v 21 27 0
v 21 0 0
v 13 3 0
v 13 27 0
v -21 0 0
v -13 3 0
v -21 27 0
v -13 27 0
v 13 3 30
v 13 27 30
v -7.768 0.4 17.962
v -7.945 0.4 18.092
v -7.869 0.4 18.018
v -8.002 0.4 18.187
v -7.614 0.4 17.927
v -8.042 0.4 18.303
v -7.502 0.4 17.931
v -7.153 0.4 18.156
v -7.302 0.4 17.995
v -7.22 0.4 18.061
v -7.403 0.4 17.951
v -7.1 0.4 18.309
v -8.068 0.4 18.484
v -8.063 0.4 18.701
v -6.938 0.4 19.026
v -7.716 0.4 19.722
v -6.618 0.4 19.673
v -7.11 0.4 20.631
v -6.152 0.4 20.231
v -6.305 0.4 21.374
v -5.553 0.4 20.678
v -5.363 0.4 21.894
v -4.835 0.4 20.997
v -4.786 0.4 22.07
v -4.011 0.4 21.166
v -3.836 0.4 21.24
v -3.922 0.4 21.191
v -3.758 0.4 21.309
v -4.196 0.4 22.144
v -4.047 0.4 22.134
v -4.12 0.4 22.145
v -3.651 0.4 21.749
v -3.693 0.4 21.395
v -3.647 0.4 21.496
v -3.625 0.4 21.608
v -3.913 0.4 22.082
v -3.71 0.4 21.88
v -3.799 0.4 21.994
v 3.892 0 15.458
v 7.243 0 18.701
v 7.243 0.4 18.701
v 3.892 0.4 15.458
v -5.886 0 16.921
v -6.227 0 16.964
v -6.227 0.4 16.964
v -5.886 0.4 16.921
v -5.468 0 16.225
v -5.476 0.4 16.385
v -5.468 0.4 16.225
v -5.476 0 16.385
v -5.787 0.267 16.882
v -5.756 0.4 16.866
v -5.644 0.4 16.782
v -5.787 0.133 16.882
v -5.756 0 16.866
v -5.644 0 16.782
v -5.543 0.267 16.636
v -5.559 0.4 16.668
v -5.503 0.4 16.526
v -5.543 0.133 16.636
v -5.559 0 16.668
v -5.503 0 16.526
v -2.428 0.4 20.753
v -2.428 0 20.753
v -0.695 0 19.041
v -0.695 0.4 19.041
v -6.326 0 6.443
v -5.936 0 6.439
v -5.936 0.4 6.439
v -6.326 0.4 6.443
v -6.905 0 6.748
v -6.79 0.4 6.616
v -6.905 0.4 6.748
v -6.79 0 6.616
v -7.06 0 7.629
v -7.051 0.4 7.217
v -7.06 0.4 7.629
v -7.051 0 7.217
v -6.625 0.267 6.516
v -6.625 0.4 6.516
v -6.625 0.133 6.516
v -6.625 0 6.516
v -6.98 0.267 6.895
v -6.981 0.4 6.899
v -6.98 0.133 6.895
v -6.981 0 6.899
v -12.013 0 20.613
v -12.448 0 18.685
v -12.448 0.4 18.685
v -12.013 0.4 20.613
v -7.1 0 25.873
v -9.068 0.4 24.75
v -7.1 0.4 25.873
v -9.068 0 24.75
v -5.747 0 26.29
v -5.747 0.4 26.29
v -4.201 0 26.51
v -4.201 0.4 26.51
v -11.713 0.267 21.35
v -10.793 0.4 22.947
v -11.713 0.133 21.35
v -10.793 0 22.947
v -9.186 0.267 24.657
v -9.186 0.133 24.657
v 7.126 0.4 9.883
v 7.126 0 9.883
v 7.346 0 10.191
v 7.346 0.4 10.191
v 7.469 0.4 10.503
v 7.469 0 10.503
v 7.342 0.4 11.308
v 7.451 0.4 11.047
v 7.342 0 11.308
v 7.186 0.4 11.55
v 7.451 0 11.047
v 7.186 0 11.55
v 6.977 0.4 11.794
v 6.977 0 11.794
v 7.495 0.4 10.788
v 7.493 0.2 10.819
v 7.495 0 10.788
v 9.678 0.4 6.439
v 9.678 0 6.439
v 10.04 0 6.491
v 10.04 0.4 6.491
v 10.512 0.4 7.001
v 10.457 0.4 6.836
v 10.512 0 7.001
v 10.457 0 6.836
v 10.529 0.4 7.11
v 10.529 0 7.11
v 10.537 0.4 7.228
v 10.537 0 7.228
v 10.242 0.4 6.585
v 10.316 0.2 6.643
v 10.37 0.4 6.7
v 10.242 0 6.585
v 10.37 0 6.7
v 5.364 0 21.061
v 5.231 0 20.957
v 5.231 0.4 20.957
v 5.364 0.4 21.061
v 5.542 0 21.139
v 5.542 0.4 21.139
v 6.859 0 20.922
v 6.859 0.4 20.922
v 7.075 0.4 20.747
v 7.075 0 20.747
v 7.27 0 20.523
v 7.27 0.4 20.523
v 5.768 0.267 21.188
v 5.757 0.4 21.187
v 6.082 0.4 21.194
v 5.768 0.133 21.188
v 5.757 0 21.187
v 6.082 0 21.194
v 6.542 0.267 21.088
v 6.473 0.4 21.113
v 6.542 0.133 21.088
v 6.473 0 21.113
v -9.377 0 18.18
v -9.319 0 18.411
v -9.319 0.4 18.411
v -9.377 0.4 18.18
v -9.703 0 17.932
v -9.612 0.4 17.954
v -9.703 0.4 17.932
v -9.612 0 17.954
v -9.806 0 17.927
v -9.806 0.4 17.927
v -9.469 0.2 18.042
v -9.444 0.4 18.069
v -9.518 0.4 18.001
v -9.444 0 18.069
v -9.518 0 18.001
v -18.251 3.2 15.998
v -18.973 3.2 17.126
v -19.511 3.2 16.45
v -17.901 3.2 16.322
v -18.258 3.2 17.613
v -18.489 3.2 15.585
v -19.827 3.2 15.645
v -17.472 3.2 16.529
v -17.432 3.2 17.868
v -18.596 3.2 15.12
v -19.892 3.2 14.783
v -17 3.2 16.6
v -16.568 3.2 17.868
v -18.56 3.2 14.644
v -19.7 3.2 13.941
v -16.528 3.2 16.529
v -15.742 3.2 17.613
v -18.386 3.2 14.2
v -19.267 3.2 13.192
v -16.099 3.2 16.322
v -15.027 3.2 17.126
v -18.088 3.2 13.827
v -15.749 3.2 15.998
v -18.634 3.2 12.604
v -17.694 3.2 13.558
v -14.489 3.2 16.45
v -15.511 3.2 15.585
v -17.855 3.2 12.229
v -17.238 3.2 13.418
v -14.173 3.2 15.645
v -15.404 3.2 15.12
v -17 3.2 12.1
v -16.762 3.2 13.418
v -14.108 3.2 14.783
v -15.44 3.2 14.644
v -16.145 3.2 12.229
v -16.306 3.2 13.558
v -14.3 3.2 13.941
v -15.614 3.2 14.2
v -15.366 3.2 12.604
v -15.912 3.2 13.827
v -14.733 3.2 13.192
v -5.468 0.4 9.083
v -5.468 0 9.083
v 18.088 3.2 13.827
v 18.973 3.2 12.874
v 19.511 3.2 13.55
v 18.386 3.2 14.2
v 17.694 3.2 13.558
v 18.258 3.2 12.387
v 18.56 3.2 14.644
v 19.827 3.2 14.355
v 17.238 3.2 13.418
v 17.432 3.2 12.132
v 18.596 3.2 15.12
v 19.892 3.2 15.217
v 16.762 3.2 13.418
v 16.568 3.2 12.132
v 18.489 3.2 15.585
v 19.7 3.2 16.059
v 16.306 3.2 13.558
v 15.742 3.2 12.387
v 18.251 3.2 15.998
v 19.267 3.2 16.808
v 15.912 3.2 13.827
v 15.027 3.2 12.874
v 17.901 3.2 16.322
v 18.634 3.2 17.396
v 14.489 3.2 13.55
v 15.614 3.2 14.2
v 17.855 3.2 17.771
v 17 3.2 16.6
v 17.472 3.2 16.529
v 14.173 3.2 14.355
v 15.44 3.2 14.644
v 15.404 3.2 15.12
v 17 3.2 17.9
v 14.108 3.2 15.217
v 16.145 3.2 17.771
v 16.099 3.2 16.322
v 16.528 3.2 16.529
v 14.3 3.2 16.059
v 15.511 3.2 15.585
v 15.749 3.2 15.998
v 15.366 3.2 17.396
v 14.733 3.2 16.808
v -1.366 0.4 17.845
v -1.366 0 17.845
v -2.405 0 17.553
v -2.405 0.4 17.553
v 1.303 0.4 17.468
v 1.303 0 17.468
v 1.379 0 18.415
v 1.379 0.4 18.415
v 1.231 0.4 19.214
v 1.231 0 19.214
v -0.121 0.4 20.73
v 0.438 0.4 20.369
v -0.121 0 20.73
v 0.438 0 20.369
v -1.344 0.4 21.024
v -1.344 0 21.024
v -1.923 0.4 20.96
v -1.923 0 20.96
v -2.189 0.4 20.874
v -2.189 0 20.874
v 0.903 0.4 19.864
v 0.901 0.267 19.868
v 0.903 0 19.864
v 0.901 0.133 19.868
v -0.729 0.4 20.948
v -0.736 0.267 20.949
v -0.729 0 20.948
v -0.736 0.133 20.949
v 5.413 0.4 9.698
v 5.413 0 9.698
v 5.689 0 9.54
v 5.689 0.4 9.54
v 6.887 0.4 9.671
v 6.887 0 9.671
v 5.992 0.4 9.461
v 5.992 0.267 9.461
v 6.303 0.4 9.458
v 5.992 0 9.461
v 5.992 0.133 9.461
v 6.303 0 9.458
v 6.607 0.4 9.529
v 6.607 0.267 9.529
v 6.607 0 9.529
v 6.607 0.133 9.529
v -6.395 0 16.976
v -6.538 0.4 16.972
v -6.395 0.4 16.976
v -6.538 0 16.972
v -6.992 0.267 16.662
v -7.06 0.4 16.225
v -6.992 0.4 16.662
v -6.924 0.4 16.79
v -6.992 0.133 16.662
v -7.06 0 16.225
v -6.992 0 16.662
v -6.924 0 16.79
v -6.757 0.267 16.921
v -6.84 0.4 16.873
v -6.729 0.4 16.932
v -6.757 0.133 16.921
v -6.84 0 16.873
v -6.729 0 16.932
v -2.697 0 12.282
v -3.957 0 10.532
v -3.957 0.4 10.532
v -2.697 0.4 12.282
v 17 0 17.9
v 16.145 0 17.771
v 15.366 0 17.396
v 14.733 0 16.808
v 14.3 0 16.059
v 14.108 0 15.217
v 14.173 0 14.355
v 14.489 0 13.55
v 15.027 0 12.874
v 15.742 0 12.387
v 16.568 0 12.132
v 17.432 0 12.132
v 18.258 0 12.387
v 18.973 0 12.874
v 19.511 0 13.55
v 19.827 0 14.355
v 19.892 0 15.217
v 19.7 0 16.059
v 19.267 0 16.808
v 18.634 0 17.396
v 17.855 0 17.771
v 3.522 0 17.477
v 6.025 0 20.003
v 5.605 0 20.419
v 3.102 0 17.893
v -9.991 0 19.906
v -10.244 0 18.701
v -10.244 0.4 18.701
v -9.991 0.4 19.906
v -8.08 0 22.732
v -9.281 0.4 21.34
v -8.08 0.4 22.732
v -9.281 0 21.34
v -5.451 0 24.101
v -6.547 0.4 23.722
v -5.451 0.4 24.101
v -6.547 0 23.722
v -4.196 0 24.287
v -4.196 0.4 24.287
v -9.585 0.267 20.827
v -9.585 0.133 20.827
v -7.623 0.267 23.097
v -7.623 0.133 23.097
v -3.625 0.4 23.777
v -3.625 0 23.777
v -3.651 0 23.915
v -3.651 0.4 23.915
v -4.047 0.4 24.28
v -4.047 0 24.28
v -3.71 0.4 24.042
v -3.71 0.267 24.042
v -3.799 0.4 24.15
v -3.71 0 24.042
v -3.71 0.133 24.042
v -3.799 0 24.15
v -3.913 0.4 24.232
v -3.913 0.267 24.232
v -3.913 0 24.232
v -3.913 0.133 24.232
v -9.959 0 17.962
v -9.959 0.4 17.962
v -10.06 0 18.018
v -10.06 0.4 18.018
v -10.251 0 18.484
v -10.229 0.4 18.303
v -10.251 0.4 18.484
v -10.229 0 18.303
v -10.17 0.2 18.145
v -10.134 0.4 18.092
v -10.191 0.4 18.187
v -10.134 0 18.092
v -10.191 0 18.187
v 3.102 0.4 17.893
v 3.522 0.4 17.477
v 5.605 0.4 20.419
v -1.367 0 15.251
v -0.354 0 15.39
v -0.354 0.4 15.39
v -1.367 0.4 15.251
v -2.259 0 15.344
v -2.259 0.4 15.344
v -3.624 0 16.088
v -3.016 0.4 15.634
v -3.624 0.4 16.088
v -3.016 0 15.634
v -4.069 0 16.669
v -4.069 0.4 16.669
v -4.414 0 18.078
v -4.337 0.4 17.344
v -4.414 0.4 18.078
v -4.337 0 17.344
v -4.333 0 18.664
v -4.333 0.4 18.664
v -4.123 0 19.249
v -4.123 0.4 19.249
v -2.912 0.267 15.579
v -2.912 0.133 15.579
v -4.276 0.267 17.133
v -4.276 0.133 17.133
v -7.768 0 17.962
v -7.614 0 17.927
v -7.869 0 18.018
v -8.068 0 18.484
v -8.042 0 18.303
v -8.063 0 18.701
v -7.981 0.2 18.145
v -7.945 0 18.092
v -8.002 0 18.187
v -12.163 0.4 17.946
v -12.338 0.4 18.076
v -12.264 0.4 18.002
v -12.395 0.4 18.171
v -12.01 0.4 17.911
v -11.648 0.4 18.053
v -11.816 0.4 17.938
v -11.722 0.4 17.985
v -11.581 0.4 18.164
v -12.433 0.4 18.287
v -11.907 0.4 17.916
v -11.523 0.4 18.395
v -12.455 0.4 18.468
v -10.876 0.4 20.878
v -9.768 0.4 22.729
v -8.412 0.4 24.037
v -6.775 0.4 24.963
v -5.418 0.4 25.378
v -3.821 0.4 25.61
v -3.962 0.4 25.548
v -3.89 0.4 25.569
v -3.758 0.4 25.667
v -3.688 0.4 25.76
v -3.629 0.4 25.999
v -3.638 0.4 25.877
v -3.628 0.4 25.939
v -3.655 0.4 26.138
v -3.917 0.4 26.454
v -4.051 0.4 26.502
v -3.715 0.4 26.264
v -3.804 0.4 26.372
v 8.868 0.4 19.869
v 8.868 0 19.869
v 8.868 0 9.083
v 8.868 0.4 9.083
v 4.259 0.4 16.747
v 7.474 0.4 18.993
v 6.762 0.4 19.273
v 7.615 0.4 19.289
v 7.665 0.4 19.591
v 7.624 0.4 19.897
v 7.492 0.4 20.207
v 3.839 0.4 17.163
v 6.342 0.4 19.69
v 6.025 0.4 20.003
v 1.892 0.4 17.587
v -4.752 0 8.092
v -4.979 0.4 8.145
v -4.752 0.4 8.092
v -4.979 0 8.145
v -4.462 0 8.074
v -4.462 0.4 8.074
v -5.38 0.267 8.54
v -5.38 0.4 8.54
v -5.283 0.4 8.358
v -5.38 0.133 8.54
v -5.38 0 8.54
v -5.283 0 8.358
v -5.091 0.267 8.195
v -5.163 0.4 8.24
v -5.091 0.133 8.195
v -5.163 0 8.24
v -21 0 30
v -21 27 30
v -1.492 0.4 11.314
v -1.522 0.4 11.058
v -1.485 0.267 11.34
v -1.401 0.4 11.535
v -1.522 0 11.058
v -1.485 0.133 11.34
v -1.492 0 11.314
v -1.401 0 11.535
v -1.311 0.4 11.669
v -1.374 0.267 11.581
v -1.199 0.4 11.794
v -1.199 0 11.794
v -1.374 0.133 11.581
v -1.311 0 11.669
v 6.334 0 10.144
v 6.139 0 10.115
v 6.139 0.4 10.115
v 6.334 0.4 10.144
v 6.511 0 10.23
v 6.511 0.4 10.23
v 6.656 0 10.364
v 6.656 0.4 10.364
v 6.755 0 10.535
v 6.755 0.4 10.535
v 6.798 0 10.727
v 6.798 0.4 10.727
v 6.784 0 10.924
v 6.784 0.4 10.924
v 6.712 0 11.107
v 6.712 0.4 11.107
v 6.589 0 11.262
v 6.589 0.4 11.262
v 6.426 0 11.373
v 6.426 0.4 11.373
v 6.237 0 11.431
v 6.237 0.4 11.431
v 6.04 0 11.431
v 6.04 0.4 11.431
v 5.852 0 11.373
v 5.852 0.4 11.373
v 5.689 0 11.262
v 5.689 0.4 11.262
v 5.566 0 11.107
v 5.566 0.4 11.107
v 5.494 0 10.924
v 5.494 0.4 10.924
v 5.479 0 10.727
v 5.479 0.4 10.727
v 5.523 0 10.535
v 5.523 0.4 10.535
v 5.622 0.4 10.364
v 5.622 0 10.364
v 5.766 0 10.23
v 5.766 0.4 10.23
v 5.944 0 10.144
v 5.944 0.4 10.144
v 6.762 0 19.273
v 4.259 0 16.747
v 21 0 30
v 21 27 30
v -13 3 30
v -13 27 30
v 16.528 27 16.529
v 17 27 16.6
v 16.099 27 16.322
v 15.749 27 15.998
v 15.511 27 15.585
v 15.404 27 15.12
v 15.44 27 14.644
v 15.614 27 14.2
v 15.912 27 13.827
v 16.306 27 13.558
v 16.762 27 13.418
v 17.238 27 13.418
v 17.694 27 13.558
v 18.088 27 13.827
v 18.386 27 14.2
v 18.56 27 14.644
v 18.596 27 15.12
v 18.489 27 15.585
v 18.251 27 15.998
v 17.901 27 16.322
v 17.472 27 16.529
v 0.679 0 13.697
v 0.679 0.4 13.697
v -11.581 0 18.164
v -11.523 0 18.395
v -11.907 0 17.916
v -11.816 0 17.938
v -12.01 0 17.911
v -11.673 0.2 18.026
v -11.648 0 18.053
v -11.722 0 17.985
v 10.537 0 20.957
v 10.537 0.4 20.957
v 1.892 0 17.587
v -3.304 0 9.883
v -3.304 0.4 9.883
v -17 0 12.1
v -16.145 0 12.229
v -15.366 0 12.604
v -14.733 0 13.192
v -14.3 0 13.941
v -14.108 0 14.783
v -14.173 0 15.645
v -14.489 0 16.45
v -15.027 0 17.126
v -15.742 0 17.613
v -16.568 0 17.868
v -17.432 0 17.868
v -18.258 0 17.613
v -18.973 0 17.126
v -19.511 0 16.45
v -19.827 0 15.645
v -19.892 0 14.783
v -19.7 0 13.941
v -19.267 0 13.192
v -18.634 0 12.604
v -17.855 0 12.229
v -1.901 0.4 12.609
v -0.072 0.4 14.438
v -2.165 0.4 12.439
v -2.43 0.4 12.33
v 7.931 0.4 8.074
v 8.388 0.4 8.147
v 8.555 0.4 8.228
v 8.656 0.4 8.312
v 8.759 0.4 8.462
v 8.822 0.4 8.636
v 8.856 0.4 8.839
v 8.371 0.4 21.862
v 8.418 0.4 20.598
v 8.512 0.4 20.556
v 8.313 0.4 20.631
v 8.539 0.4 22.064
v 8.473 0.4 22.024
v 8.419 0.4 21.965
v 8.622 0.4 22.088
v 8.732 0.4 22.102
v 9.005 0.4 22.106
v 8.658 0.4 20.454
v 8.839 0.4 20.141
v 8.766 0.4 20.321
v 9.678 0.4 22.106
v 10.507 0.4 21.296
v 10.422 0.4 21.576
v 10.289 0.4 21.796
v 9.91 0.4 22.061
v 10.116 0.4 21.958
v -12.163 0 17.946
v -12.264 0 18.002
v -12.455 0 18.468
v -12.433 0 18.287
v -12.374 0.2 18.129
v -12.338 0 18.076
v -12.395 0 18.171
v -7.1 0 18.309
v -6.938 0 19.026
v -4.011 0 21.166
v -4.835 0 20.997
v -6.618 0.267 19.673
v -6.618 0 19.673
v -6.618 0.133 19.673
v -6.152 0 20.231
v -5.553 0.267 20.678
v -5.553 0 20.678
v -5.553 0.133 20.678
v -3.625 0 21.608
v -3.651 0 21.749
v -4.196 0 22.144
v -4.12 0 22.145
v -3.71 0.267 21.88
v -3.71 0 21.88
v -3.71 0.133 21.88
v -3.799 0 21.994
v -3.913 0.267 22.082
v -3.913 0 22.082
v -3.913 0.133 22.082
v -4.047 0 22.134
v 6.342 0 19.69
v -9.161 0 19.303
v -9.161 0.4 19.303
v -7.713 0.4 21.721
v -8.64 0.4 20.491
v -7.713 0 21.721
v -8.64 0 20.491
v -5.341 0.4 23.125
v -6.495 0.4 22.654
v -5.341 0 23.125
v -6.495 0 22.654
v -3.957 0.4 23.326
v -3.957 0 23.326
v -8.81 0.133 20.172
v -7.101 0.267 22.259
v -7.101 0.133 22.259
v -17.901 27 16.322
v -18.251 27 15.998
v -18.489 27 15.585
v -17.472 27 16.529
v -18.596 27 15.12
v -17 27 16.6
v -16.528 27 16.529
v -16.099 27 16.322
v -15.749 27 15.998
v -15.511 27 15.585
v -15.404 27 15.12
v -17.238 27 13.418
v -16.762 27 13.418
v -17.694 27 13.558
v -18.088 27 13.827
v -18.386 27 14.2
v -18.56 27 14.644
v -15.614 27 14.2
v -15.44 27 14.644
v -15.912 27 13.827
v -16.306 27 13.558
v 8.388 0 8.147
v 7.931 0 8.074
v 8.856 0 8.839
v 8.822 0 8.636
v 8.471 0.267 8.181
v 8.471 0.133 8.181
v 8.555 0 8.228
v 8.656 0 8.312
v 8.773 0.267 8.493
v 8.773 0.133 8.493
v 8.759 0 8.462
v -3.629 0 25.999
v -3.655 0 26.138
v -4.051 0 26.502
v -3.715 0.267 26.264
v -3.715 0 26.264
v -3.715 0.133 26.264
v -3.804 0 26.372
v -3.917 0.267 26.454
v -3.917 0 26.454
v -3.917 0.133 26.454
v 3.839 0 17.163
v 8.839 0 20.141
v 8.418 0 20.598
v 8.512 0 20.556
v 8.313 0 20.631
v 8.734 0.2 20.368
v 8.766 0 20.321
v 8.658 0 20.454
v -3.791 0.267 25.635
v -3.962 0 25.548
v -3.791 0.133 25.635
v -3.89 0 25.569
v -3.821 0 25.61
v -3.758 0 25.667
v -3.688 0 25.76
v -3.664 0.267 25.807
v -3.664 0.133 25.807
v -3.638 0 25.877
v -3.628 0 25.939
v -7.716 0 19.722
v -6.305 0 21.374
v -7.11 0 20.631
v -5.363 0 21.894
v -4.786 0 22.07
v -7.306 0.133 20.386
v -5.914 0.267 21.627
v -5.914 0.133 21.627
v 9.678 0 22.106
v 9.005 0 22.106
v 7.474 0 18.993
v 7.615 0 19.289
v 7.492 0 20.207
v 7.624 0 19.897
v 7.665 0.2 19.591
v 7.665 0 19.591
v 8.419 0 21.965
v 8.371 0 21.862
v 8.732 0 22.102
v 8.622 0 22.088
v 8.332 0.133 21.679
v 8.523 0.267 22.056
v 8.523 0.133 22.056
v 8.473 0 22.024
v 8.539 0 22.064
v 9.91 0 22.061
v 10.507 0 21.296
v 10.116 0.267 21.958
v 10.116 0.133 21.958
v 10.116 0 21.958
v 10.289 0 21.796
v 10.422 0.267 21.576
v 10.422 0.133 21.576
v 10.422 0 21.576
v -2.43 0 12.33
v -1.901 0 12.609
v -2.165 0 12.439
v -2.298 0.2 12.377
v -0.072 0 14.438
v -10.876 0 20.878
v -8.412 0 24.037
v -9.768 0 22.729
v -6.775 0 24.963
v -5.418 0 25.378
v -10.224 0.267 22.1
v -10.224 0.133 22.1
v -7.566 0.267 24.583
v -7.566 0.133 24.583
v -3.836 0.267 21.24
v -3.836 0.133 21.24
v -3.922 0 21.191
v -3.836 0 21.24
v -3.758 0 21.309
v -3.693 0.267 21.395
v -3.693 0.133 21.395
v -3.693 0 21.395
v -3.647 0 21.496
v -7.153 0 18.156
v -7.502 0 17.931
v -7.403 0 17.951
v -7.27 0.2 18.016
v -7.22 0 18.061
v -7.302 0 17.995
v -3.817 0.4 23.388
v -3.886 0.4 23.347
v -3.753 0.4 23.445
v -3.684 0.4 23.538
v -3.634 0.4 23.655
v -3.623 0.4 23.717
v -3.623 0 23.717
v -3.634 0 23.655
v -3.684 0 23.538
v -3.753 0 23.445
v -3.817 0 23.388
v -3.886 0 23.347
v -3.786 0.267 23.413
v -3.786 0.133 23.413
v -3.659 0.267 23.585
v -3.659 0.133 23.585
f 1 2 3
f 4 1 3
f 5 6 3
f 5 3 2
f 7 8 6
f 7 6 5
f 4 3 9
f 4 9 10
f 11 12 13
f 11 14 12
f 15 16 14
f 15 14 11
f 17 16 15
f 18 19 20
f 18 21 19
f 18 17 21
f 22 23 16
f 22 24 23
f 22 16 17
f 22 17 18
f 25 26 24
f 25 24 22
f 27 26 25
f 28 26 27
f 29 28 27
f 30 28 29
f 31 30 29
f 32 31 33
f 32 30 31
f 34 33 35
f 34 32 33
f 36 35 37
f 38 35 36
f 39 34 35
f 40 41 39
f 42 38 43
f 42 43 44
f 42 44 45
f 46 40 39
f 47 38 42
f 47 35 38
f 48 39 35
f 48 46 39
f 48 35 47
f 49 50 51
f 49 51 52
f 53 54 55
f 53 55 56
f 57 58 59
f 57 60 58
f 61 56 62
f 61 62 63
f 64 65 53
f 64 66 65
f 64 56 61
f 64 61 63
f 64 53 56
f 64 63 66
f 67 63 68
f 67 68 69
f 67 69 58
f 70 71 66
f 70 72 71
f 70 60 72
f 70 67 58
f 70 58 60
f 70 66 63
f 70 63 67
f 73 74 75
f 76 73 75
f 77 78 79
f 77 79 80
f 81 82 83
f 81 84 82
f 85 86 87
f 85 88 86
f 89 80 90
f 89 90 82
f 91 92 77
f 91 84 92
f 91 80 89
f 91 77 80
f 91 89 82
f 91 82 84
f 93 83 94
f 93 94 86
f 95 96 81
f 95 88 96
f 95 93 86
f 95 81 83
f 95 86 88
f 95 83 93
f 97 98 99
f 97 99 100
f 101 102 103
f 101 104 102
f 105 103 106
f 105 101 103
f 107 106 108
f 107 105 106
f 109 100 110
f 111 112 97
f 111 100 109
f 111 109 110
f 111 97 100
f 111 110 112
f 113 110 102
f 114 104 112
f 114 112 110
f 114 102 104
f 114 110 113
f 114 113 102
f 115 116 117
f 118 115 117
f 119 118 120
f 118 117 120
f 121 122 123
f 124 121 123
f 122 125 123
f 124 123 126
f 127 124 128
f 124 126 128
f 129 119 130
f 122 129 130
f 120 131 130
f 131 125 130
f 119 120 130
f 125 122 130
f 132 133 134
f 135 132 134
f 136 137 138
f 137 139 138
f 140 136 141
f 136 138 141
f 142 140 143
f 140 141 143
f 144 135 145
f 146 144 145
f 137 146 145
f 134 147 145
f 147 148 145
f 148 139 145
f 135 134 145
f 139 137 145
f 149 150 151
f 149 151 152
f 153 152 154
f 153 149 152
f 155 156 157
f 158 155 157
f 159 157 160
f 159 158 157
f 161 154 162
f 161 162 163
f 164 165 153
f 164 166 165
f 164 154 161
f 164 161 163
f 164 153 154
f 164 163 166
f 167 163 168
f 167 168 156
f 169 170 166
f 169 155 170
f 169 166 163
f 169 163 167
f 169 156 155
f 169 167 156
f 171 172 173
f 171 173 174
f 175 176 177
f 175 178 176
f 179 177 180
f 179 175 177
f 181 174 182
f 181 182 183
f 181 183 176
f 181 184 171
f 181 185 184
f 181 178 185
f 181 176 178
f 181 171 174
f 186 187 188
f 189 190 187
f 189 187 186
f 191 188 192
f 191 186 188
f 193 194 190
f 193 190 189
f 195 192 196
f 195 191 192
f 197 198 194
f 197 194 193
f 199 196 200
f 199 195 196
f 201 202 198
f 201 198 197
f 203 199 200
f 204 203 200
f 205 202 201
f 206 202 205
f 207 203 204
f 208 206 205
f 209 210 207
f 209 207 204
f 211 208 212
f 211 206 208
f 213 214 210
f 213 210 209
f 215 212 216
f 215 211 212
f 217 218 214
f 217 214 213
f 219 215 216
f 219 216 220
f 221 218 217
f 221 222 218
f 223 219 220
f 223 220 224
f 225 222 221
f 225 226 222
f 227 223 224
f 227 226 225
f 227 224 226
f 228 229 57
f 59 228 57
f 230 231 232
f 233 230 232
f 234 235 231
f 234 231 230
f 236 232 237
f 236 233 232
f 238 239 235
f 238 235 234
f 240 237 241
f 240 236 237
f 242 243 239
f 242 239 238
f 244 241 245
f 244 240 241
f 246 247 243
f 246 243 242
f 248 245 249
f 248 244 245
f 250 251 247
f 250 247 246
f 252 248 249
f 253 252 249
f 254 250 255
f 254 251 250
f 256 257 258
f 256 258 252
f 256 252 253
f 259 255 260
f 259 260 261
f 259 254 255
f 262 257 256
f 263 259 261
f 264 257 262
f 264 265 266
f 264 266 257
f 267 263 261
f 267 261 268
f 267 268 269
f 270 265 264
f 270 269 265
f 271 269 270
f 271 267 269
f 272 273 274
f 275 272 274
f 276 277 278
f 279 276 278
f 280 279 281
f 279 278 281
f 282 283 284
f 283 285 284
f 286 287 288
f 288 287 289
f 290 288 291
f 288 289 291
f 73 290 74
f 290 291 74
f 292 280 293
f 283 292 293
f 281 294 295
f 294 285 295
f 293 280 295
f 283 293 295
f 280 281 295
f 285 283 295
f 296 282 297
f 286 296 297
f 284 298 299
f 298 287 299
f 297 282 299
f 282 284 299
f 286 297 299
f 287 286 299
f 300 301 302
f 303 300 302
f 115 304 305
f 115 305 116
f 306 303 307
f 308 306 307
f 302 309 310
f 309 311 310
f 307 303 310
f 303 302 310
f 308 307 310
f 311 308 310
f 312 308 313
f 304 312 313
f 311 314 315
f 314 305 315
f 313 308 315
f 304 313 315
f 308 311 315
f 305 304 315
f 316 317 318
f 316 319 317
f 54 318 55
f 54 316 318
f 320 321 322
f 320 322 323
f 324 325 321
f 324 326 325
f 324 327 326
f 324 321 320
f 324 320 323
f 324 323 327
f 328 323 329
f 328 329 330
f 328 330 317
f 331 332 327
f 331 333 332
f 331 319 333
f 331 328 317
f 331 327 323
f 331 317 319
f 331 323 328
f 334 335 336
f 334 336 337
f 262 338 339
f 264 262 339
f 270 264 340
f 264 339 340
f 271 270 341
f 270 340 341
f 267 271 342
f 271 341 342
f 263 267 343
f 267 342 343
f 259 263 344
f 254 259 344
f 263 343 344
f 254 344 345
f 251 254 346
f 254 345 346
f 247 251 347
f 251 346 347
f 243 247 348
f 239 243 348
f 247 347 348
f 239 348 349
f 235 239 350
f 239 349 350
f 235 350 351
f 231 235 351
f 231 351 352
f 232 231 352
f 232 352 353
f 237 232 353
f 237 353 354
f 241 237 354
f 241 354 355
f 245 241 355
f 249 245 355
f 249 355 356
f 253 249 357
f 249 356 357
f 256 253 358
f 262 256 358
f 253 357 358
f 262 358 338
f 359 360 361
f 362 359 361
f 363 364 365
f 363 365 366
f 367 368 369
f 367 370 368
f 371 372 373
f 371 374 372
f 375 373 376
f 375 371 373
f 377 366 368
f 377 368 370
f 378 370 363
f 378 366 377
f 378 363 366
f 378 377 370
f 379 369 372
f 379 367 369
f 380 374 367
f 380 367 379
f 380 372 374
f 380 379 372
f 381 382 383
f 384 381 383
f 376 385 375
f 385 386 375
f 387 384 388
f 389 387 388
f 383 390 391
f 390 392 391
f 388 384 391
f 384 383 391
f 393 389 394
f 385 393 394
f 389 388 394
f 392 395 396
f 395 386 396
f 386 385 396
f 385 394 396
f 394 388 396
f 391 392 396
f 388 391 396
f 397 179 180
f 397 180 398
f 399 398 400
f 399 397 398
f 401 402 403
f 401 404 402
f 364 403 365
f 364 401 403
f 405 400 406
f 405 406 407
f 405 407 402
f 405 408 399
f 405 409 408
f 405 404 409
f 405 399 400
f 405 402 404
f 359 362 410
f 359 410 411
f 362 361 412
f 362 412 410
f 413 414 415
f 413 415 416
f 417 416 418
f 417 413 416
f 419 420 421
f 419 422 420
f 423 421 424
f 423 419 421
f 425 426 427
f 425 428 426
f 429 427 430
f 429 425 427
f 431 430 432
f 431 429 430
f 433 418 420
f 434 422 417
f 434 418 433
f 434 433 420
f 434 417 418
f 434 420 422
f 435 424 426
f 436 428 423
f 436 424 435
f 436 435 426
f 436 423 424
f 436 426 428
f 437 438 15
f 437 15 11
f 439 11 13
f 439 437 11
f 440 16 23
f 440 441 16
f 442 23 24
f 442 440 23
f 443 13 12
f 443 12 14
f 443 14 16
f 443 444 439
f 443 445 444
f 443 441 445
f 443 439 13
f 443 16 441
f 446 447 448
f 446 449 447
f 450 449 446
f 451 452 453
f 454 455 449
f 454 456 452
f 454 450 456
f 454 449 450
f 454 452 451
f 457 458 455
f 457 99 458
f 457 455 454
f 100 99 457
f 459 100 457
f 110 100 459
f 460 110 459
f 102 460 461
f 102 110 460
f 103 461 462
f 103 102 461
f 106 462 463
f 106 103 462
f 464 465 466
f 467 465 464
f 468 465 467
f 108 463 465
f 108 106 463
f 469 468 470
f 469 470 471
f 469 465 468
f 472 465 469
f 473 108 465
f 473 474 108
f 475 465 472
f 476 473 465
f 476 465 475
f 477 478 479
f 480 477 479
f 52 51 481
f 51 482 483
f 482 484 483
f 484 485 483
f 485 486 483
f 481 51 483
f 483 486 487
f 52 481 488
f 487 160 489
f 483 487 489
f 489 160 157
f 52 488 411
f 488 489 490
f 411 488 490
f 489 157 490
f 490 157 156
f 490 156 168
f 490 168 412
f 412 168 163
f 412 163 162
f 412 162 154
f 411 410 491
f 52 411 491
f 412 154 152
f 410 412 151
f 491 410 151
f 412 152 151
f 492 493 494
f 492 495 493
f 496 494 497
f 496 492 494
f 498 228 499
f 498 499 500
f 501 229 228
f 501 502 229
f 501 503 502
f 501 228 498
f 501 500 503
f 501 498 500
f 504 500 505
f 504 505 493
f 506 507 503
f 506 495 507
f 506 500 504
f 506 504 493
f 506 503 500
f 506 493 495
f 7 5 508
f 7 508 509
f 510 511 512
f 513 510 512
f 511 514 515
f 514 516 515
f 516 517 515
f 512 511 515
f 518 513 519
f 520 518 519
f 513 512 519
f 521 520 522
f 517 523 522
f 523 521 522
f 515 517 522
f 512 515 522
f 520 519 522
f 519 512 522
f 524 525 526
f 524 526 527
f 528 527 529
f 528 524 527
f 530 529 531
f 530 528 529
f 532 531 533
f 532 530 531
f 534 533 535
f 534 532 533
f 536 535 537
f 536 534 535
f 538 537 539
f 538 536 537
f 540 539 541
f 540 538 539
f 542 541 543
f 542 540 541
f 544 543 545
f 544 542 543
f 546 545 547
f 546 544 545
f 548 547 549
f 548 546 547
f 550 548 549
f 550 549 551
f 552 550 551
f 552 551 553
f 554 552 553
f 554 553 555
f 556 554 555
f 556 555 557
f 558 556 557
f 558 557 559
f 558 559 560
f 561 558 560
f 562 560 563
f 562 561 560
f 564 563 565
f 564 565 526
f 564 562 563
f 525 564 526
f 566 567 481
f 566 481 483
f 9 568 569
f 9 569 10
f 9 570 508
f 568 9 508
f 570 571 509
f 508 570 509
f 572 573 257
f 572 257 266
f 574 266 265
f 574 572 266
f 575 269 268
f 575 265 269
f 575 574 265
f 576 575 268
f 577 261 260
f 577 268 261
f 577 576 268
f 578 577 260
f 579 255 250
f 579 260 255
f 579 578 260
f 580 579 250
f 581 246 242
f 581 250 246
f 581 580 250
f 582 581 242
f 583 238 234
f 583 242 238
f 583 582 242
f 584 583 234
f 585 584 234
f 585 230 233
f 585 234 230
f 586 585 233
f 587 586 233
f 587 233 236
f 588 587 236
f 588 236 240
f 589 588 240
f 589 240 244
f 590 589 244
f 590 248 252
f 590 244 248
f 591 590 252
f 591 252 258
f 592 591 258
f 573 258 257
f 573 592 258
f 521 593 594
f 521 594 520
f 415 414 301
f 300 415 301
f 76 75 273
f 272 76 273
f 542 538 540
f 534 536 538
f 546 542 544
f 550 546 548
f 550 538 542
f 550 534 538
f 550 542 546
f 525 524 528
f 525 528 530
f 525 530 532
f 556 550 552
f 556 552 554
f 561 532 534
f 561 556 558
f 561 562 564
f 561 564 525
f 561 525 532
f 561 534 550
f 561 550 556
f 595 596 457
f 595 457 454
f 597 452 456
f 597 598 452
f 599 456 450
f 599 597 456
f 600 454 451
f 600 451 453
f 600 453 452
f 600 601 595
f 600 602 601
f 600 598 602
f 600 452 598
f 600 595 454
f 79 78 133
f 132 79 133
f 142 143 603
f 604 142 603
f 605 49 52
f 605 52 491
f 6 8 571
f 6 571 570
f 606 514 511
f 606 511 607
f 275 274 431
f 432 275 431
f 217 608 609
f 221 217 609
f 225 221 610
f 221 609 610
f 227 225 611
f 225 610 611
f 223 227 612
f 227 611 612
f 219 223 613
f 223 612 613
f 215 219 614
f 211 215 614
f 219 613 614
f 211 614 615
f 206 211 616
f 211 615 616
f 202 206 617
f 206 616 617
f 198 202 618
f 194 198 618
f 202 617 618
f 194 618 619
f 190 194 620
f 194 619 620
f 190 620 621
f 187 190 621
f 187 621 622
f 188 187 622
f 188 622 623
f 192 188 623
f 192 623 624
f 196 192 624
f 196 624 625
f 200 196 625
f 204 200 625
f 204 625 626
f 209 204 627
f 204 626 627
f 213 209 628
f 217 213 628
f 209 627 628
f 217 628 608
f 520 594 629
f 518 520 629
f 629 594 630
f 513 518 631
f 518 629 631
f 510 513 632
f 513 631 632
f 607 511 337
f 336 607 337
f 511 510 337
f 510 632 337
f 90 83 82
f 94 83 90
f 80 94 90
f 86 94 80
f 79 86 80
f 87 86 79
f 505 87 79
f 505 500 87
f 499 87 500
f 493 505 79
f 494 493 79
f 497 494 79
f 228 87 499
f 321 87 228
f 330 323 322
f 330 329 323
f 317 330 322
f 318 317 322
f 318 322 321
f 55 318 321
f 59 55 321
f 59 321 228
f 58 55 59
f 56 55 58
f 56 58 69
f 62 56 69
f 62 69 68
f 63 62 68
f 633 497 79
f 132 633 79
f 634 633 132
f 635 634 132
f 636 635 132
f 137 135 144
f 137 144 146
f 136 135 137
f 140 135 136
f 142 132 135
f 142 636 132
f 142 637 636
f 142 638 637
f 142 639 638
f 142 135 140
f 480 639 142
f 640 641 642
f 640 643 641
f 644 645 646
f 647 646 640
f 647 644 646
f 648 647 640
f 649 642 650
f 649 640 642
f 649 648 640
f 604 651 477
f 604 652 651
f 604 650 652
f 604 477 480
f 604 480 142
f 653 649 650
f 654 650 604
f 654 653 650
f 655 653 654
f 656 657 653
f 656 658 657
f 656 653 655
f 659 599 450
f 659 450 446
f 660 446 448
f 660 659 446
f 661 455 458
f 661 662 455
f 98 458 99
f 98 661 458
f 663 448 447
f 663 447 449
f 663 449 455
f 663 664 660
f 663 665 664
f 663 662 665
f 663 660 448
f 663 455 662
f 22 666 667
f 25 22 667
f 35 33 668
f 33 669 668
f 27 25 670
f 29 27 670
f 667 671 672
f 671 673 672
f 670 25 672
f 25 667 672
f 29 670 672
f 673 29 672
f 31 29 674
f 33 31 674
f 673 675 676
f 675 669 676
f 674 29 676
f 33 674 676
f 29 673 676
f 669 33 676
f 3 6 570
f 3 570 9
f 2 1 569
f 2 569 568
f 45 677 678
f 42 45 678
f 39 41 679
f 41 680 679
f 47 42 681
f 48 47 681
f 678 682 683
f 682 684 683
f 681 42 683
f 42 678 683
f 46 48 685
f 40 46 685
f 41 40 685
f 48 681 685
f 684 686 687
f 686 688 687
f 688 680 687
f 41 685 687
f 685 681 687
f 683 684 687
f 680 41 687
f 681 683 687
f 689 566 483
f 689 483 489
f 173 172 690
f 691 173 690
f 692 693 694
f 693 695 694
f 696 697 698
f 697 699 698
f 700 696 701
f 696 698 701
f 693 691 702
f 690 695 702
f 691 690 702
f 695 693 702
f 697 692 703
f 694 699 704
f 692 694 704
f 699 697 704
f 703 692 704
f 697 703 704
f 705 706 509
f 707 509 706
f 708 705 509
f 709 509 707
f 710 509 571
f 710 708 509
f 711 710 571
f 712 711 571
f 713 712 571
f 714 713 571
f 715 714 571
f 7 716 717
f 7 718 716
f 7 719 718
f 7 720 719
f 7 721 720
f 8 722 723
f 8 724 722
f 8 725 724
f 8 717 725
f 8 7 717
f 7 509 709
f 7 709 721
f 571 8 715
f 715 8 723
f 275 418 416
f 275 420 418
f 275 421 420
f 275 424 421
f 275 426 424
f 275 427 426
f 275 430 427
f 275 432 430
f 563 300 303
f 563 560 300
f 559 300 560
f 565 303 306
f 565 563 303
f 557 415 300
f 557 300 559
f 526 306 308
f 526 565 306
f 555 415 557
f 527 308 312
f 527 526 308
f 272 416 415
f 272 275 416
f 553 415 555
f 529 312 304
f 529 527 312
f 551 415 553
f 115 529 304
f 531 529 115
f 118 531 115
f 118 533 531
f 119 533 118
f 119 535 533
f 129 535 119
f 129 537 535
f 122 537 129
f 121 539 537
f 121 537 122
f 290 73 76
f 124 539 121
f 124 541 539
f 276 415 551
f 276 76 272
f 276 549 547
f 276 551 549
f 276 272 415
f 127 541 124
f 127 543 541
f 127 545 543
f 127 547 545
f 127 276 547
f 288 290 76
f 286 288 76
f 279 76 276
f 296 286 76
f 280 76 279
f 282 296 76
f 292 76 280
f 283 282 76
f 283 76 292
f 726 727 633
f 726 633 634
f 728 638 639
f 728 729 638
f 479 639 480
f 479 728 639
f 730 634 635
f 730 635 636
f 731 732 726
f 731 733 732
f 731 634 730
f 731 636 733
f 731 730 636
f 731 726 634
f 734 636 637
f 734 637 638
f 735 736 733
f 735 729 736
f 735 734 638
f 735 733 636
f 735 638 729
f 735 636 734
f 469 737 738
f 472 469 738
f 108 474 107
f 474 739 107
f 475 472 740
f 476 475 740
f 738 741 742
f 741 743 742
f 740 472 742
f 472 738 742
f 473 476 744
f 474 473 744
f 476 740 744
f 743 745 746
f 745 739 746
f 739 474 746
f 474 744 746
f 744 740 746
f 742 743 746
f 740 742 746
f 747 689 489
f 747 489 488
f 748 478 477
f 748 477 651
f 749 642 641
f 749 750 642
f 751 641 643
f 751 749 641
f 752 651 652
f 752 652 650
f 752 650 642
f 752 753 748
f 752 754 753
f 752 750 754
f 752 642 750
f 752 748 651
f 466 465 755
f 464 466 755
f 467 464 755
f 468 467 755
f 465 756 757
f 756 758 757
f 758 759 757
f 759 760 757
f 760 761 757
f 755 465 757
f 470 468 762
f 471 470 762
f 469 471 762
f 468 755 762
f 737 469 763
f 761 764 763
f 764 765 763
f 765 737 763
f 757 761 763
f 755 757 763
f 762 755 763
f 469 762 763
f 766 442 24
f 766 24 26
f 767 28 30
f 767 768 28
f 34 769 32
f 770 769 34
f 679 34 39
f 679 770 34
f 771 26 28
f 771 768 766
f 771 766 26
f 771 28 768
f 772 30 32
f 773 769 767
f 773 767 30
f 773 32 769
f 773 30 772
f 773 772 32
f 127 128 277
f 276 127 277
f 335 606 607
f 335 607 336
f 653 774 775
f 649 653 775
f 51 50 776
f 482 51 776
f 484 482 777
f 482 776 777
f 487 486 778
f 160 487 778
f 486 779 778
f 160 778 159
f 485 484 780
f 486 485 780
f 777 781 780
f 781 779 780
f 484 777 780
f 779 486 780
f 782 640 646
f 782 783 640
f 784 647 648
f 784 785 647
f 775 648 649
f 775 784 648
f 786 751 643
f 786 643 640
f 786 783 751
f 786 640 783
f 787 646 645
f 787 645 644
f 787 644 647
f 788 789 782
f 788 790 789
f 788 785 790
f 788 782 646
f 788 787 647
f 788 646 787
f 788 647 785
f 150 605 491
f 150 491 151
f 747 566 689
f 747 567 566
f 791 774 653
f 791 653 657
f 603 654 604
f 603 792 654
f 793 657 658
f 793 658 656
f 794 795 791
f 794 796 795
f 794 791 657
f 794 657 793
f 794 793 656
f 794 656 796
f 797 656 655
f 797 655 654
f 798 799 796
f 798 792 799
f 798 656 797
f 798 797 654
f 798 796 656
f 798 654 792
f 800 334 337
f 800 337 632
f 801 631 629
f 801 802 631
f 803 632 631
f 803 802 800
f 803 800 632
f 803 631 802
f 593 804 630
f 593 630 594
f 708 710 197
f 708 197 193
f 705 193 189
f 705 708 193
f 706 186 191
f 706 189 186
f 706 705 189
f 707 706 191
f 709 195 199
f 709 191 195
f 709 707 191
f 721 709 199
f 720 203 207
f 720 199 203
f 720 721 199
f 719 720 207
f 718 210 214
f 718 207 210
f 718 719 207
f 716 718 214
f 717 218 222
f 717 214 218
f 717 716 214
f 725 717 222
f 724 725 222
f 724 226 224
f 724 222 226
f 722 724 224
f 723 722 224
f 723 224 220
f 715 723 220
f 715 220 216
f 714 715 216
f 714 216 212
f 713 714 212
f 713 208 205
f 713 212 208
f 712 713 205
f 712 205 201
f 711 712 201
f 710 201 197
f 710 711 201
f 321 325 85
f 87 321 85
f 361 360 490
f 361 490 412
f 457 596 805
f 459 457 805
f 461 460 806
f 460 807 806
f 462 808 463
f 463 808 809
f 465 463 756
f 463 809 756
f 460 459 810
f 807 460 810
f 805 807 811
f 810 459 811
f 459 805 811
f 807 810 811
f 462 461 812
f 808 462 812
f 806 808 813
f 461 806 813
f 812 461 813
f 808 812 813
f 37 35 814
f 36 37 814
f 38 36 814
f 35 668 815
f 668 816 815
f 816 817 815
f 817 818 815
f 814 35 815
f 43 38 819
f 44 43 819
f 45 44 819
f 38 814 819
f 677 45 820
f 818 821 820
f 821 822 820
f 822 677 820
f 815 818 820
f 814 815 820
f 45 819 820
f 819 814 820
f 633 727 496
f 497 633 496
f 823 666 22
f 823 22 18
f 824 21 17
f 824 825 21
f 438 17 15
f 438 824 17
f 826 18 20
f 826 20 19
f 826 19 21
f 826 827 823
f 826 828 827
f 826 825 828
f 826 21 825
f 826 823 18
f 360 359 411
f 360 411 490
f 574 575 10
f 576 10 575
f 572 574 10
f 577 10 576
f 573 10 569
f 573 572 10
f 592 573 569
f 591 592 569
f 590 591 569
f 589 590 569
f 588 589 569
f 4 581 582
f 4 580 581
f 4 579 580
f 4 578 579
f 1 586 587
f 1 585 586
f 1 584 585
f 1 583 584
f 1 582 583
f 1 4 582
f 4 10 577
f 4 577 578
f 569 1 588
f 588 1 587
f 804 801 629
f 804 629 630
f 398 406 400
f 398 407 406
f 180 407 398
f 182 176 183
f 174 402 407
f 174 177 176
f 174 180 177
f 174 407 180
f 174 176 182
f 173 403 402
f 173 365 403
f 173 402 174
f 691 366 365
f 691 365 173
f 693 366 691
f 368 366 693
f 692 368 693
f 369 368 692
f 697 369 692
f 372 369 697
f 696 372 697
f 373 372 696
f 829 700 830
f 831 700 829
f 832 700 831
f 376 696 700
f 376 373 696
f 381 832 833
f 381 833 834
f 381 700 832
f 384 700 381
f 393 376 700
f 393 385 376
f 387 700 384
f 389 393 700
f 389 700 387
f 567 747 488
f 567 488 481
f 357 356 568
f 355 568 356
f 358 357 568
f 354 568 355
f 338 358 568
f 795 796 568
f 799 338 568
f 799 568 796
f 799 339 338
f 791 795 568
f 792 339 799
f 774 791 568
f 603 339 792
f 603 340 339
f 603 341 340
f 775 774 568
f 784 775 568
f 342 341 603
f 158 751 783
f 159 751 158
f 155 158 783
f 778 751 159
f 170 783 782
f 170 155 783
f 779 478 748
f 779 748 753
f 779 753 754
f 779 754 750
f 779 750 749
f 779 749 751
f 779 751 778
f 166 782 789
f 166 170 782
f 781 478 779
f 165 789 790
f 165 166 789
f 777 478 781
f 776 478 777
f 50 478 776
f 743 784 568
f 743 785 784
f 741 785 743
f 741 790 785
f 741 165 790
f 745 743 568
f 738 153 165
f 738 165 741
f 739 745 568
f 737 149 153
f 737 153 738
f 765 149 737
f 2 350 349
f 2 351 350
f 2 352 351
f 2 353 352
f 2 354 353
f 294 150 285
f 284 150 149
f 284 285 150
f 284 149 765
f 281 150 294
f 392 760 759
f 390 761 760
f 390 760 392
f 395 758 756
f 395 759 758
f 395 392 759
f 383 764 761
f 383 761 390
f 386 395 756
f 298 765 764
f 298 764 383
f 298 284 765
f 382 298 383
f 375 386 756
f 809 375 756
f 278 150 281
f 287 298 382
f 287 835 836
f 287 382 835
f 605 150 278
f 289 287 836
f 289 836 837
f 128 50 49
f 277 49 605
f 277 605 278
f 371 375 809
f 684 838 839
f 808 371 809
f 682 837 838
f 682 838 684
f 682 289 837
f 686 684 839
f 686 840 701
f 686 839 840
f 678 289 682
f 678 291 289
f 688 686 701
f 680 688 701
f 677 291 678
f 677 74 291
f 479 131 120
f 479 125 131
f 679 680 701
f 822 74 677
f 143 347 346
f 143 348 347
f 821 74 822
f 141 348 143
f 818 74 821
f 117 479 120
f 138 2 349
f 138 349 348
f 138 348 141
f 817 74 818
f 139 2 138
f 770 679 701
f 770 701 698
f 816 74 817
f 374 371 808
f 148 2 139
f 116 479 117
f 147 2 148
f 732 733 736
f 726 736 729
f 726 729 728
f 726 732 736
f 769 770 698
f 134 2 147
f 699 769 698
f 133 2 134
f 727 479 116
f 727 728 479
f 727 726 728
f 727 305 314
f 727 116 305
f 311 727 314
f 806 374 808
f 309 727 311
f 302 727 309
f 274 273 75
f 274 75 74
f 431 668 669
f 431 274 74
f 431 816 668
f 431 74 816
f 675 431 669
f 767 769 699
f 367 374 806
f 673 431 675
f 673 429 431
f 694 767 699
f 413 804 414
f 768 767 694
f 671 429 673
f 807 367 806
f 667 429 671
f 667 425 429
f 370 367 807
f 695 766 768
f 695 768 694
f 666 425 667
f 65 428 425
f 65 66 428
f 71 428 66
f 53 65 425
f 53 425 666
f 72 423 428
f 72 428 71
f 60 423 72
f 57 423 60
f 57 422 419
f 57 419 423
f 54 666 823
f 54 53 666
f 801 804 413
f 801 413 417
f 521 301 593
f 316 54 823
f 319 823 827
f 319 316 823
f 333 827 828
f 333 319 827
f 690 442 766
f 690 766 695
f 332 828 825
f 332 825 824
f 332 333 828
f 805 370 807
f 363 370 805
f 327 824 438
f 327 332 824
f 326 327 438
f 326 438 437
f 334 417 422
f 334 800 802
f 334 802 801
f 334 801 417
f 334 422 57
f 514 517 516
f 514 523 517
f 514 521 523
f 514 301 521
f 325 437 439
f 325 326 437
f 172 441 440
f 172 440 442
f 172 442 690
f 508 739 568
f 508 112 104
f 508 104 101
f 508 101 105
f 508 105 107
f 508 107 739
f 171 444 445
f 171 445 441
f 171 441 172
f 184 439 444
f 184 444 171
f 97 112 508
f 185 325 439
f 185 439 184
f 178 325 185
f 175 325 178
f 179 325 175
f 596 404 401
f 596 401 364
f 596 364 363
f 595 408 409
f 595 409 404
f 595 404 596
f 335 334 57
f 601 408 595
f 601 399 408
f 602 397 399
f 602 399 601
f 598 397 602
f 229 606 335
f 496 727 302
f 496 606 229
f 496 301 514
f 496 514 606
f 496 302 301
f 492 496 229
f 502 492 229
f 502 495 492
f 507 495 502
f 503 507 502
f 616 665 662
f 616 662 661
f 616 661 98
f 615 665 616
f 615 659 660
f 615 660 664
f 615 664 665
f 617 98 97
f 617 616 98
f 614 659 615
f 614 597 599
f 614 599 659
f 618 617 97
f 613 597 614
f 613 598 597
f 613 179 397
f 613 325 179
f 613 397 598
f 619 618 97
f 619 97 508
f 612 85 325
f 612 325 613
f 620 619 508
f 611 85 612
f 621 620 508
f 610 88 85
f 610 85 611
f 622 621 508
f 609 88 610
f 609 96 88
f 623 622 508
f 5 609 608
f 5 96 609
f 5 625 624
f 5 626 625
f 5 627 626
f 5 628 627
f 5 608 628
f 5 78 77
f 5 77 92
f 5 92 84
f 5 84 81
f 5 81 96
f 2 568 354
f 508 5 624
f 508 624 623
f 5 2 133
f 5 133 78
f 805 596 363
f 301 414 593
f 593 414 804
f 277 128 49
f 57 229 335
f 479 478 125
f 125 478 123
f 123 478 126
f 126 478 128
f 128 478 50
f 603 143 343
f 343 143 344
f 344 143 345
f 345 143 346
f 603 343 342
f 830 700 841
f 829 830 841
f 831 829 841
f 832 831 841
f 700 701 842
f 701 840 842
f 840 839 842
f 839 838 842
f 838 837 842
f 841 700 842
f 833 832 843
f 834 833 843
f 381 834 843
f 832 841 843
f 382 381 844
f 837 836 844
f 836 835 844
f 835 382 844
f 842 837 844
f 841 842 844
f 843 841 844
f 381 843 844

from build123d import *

# Parameters (mm, degrees)
SALIENTE_EXTRUIR1_DEPTH    = 30
CORTAR_EXTRUIR1_DEPTH      = 15
CORTAR_EXTRUIR1_DEPTH_BACK = 41
CROQUIS2_R                 = 1.6
CROQUIS3_R                 = 2.9
CORTAR_EXTRUIR2_DEPTH      = 3.2
SKETCH1_R                  = 0.661549992
CUT_EXTRUDE1_DEPTH         = 0.4


with BuildPart() as part:
    # Croquis1 → Saliente-Extruir1 (new body)
    with BuildSketch(Plane.XY):
        Polygon((-21, 0), (-21, 27), (-13, 27), (-13, 3), (13, 3), (13, 27), (21, 27), (21, 0), align=None)
    extrude(amount=SALIENTE_EXTRUIR1_DEPTH)

    # Croquis2 → Cortar-Extruir1 (cut, two sides: drawn at the far end of the back side and taken through both)
    with BuildSketch(Plane.XZ.offset(-CORTAR_EXTRUIR1_DEPTH_BACK)):
        with Locations(Location((-17, 15, 0), (0, 0, 90))):
            Circle(CROQUIS2_R)
        with Locations(Location((17, 15, 0), (0, 0, 90))):
            Circle(CROQUIS2_R)
    extrude(amount=CORTAR_EXTRUIR1_DEPTH + CORTAR_EXTRUIR1_DEPTH_BACK, mode=Mode.SUBTRACT)

    # Croquis3 → Cortar-Extruir2 (cut)
    with BuildSketch(Plane.XZ):
        with Locations(Location((-17, 15, 0), (0, 0, 270))):
            Circle(CROQUIS3_R)
        with Locations(Location((17, 15, 0), (0, 0, 90))):
            Circle(CROQUIS3_R)
    extrude(amount=-CORTAR_EXTRUIR2_DEPTH, mode=Mode.SUBTRACT)

    # Sketch1 → Cut-Extrude1 (cut)
    # profile 1 of 7: a face of its own
    with BuildSketch(Plane.XZ):
        with BuildLine():
            Line((-5.935999793, 6.438605572), (9.678181575, 6.438605572))
            add(Edge.make_bspline(
                [(9.678181575, 6.438605572), (10.524299676, 6.453092153), (10.536716692, 7.227891763)],
                knots=[0, 0, 0, 1, 1, 1], degree=2))
            Line((10.536716692, 7.227891763), (10.536716692, 20.957100846))
            add(Edge.make_bspline(
                [(9.678181575, 22.106217079), (10.162482833, 22.073196538), (10.536716692, 21.695427507), (10.536716692, 20.957100846)],
                knots=[0, 0, 0, 0, 1, 1, 1, 1], degree=3))
            Line((9.678181575, 22.106217079), (9.004561714, 22.106217079))
            add(Edge.make_bspline(
                [(8.312539005, 20.630919436), (8.286013306, 22.128234394), (8.338307263, 22.106217079), (9.004561714, 22.106217079)],
                knots=[0, 0, 0, 0, 1, 1, 1, 1], degree=3))
            add(Edge.make_bspline(
                [(8.867643901, 19.868961385), (8.878593238, 20.486835473), (8.312539005, 20.630919436)],
                knots=[0, 0, 0, 1, 1, 1], degree=2))
            Line((8.867643901, 19.868961385), (8.867643901, 9.082596351))
            add(Edge.make_bspline(
                [(7.931444331, 8.073576195), (8.599546043, 8.102198014), (8.867643901, 8.329896708), (8.867643901, 9.082596351)],
                knots=[0, 0, 0, 0, 1, 1, 1, 1], degree=3))
            Line((7.931444331, 8.073576195), (-4.462187712, 8.073576195))
            add(Edge.make_bspline(
                [(-5.467904846, 9.082596351), (-5.433709159, 8.449976132), (-5.30844888, 8.073576195), (-4.462187712, 8.073576195)],
                knots=[0, 0, 0, 0, 1, 1, 1, 1], degree=3))
            Line((-5.467904846, 9.082596351), (-5.467904846, 16.225240488))
            add(Edge.make_bspline(
                [(-6.227323907, 16.964134709), (-5.679994854, 16.964134709), (-5.467904846, 16.719544079), (-5.467904846, 16.225240488)],
                knots=[0, 0, 0, 0, 1, 1, 1, 1], degree=3))
            add(Edge.make_bspline(
                [(-7.060451344, 16.225240488), (-7.033250732, 16.738079235), (-6.945687764, 17.041102265), (-6.227323907, 16.964134709)],
                knots=[0, 0, 0, 0, 1, 1, 1, 1], degree=3))
            Line((-7.060451344, 16.225240488), (-7.060451344, 7.629208643))
            add(Edge.make_bspline(
                [(-5.935999793, 6.438605572), (-6.811453061, 6.382227451), (-7.096596098, 6.700746565), (-7.060451344, 7.629208643)],
                knots=[0, 0, 0, 0, 1, 1, 1, 1], degree=3))
        make_face()
    # profile 2 of 7: a face of its own
    with BuildSketch(Plane.XZ):
        with BuildLine():
            Line((-1.522038325, 11.057965372), (-3.304487637, 9.883355918))
            Line((-3.304487637, 9.883355918), (-3.95725526, 10.532266036))
            Line((-3.95725526, 10.532266036), (-2.69664778, 12.281859139))
            add(Edge.make_bspline(
                [(-2.69664778, 12.281859139), (-2.296419712, 12.30894865), (-1.901088431, 12.60910176)],
                knots=[0, 0, 0, 1, 1, 1], degree=2))
            Line((-1.901088431, 12.60910176), (-0.072061062, 14.43812913))
            Line((-0.072061062, 14.43812913), (0.678700134, 13.69714151))
            Line((0.678700134, 13.69714151), (-1.199414528, 11.794254647))
            add(Edge.make_bspline(
                [(-1.522038325, 11.057965372), (-1.526686537, 11.364992788), (-1.400661149, 11.590353596), (-1.199414528, 11.794254647)],
                knots=[0, 0, 0, 0, 1, 1, 1, 1], degree=3))
        make_face()
    # profile 3 of 7: a face of its own
    with BuildSketch(Plane.XZ):
        with BuildLine():
            Line((-0.354442309, 15.390176677), (5.412555572, 9.698254849))
            add(Edge.make_bspline(
                [(5.412555572, 9.698254849), (5.928798687, 9.302057302), (6.700610258, 9.391128714), (7.125727085, 9.883355918)],
                knots=[0, 0, 0, 0, 1, 1, 1, 1], degree=3))
            add(Edge.make_bspline(
                [(7.125727085, 9.883355918), (7.934302129, 10.799871296), (6.977240411, 11.794254647)],
                knots=[0, 0, 0, 1, 1, 1], degree=2))
            Line((6.977240411, 11.794254647), (1.303415875, 17.468079182))
            add(Edge.make_bspline(
                [(1.303415875, 17.468079182), (1.911666945, 20.540477103), (-1.10270103, 21.574939106), (-2.42824136, 20.752545127)],
                knots=[0, 0, 0, 0, 1, 1, 1, 1], degree=3))
            Line((-2.42824136, 20.752545127), (-0.694584651, 19.041457544))
            Line((-0.694584651, 19.041457544), (-1.366070433, 17.845234527))
            Line((-1.366070433, 17.845234527), (-2.405054872, 17.553329375))
            Line((-2.405054872, 17.553329375), (-4.123067785, 19.248976817))
            add(Edge.make_bspline(
                [(-0.354442309, 15.390176677), (-3.400230967, 14.629724328), (-5.142448484, 17.119603802), (-4.123067785, 19.248976817)],
                knots=[0, 0, 0, 0, 1, 1, 1, 1], degree=3))
        make_face()
        with Locations(Location((6.13875523, 10.776625251, 0), (0, 0, 270))):
            Circle(SKETCH1_R, mode=Mode.SUBTRACT)
    # profile 4 of 7: a face of its own
    with BuildSketch(Plane.XZ):
        with BuildLine():
            Line((3.89207141, 15.458279189), (1.891941088, 17.586897539))
            Line((1.891941088, 17.586897539), (5.230965028, 20.957100846))
            add(Edge.make_bspline(
                [(5.230965028, 20.957100846), (5.555451632, 21.309870343), (6.660184694, 21.36409952), (7.269640603, 20.523170445)],
                knots=[0, 0, 0, 0, 1, 1, 1, 1], degree=3))
            add(Edge.make_bspline(
                [(7.242774573, 18.701199897), (8.073193496, 19.568863686), (7.269640603, 20.523170445)],
                knots=[0, 0, 0, 1, 1, 1], degree=2))
            Line((7.242774573, 18.701199897), (3.89207141, 15.458279189))
        make_face()
        Polygon((3.839024866, 17.163144155), (4.259148948, 16.746906842), (6.762194587, 19.273325593), (6.342070505, 19.689562906), align=None, mode=Mode.SUBTRACT)
        Polygon((3.102284891, 17.893068195), (3.522408973, 17.476830882), (6.025454613, 20.003249633), (5.60533053, 20.419486946), align=None, mode=Mode.SUBTRACT)
    # profile 5 of 7: a face of its own
    with BuildSketch(Plane.XZ):
        with BuildLine():
            add(Edge.make_bspline(
                [(-7.099579962, 18.308936967), (-6.944184766, 19.799579775), (-5.756766751, 20.990125682), (-4.011121589, 21.166157127)],
                knots=[0, 0, 0, 0, 1, 1, 1, 1], degree=3))
            add(Edge.make_bspline(
                [(-4.011121589, 21.166157127), (-3.833143245, 21.190875028), (-3.641894385, 21.375340953), (-3.624888541, 21.60783322)],
                knots=[0, 0, 0, 0, 1, 1, 1, 1], degree=3))
            add(Edge.make_bspline(
                [(-3.624888541, 21.60783322), (-3.639467746, 21.893086016), (-3.884725351, 22.173601101), (-4.195925218, 22.143963019)],
                knots=[0, 0, 0, 0, 1, 1, 1, 1], degree=3))
            add(Edge.make_bspline(
                [(-8.06346903, 18.701199897), (-7.725118315, 20.514418332), (-5.974799785, 22.083491135), (-4.195925218, 22.143963019)],
                knots=[0, 0, 0, 0, 1, 1, 1, 1], degree=3))
            add(Edge.make_bspline(
                [(-7.614023361, 17.927066284), (-8.122682955, 17.975749279), (-8.06346903, 18.701199897)],
                knots=[0, 0, 0, 1, 1, 1], degree=2))
            add(Edge.make_bspline(
                [(-7.099579962, 18.308936967), (-7.183532259, 17.914926879), (-7.614023361, 17.927066284)],
                knots=[0, 0, 0, 1, 1, 1], degree=2))
        make_face()
    # profile 6 of 7: a face of its own
    with BuildSketch(Plane.XZ):
        with BuildLine():
            add(Edge.make_bspline(
                [(-9.319053754, 18.411393731), (-9.333101087, 19.560108027), (-7.895947649, 23.219067723), (-3.95725526, 23.325518869)],
                knots=[0, 0, 0, 0, 1, 1, 1, 1], degree=3))
            add(Edge.make_bspline(
                [(-3.95725526, 23.325518869), (-3.779276916, 23.35023677), (-3.597859082, 23.595665467), (-3.624888541, 23.776531501)],
                knots=[0, 0, 0, 0, 1, 1, 1, 1], degree=3))
            add(Edge.make_bspline(
                [(-3.624888541, 23.776531501), (-3.639467746, 24.061784297), (-3.884725351, 24.317135086), (-4.195925218, 24.287497003)],
                knots=[0, 0, 0, 0, 1, 1, 1, 1], degree=3))
            add(Edge.make_bspline(
                [(-10.243657996, 18.701199897), (-10.182828773, 20.346306567), (-8.409956491, 24.044181671), (-4.195925218, 24.287497003)],
                knots=[0, 0, 0, 0, 1, 1, 1, 1], degree=3))
            add(Edge.make_bspline(
                [(-9.805687565, 17.927066284), (-10.31434716, 17.975749279), (-10.243657996, 18.701199897)],
                knots=[0, 0, 0, 1, 1, 1], degree=2))
            add(Edge.make_bspline(
                [(-9.319053754, 18.411393731), (-9.375196464, 17.914926879), (-9.805687565, 17.927066284)],
                knots=[0, 0, 0, 1, 1, 1], degree=2))
        make_face()
    # profile 7 of 7: a face of its own
    with BuildSketch(Plane.XZ):
        with BuildLine():
            add(Edge.make_bspline(
                [(-11.523144368, 18.395379414), (-11.040898376, 22.612315512), (-7.900523453, 25.441163991), (-3.961831064, 25.547615136)],
                knots=[0, 0, 0, 0, 1, 1, 1, 1], degree=3))
            add(Edge.make_bspline(
                [(-3.961831064, 25.547615136), (-3.783852719, 25.572333037), (-3.602434885, 25.817761734), (-3.629464345, 25.998627769)],
                knots=[0, 0, 0, 0, 1, 1, 1, 1], degree=3))
            add(Edge.make_bspline(
                [(-3.629464345, 25.998627769), (-3.644043549, 26.283880564), (-3.889301155, 26.539231353), (-4.200501022, 26.50959327)],
                knots=[0, 0, 0, 0, 1, 1, 1, 1], degree=3))
            add(Edge.make_bspline(
                [(-12.44774861, 18.68518558), (-12.386919387, 20.33029225), (-10.637820975, 26.082784436), (-4.200501022, 26.50959327)],
                knots=[0, 0, 0, 0, 1, 1, 1, 1], degree=3))
            add(Edge.make_bspline(
                [(-12.00977818, 17.911051966), (-12.518437774, 17.959734961), (-12.44774861, 18.68518558)],
                knots=[0, 0, 0, 1, 1, 1], degree=2))
            add(Edge.make_bspline(
                [(-11.523144368, 18.395379414), (-11.579287078, 17.898912561), (-12.00977818, 17.911051966)],
                knots=[0, 0, 0, 1, 1, 1], degree=2))
        make_face()
    extrude(amount=-CUT_EXTRUDE1_DEPTH, mode=Mode.SUBTRACT)


solid = part.part
